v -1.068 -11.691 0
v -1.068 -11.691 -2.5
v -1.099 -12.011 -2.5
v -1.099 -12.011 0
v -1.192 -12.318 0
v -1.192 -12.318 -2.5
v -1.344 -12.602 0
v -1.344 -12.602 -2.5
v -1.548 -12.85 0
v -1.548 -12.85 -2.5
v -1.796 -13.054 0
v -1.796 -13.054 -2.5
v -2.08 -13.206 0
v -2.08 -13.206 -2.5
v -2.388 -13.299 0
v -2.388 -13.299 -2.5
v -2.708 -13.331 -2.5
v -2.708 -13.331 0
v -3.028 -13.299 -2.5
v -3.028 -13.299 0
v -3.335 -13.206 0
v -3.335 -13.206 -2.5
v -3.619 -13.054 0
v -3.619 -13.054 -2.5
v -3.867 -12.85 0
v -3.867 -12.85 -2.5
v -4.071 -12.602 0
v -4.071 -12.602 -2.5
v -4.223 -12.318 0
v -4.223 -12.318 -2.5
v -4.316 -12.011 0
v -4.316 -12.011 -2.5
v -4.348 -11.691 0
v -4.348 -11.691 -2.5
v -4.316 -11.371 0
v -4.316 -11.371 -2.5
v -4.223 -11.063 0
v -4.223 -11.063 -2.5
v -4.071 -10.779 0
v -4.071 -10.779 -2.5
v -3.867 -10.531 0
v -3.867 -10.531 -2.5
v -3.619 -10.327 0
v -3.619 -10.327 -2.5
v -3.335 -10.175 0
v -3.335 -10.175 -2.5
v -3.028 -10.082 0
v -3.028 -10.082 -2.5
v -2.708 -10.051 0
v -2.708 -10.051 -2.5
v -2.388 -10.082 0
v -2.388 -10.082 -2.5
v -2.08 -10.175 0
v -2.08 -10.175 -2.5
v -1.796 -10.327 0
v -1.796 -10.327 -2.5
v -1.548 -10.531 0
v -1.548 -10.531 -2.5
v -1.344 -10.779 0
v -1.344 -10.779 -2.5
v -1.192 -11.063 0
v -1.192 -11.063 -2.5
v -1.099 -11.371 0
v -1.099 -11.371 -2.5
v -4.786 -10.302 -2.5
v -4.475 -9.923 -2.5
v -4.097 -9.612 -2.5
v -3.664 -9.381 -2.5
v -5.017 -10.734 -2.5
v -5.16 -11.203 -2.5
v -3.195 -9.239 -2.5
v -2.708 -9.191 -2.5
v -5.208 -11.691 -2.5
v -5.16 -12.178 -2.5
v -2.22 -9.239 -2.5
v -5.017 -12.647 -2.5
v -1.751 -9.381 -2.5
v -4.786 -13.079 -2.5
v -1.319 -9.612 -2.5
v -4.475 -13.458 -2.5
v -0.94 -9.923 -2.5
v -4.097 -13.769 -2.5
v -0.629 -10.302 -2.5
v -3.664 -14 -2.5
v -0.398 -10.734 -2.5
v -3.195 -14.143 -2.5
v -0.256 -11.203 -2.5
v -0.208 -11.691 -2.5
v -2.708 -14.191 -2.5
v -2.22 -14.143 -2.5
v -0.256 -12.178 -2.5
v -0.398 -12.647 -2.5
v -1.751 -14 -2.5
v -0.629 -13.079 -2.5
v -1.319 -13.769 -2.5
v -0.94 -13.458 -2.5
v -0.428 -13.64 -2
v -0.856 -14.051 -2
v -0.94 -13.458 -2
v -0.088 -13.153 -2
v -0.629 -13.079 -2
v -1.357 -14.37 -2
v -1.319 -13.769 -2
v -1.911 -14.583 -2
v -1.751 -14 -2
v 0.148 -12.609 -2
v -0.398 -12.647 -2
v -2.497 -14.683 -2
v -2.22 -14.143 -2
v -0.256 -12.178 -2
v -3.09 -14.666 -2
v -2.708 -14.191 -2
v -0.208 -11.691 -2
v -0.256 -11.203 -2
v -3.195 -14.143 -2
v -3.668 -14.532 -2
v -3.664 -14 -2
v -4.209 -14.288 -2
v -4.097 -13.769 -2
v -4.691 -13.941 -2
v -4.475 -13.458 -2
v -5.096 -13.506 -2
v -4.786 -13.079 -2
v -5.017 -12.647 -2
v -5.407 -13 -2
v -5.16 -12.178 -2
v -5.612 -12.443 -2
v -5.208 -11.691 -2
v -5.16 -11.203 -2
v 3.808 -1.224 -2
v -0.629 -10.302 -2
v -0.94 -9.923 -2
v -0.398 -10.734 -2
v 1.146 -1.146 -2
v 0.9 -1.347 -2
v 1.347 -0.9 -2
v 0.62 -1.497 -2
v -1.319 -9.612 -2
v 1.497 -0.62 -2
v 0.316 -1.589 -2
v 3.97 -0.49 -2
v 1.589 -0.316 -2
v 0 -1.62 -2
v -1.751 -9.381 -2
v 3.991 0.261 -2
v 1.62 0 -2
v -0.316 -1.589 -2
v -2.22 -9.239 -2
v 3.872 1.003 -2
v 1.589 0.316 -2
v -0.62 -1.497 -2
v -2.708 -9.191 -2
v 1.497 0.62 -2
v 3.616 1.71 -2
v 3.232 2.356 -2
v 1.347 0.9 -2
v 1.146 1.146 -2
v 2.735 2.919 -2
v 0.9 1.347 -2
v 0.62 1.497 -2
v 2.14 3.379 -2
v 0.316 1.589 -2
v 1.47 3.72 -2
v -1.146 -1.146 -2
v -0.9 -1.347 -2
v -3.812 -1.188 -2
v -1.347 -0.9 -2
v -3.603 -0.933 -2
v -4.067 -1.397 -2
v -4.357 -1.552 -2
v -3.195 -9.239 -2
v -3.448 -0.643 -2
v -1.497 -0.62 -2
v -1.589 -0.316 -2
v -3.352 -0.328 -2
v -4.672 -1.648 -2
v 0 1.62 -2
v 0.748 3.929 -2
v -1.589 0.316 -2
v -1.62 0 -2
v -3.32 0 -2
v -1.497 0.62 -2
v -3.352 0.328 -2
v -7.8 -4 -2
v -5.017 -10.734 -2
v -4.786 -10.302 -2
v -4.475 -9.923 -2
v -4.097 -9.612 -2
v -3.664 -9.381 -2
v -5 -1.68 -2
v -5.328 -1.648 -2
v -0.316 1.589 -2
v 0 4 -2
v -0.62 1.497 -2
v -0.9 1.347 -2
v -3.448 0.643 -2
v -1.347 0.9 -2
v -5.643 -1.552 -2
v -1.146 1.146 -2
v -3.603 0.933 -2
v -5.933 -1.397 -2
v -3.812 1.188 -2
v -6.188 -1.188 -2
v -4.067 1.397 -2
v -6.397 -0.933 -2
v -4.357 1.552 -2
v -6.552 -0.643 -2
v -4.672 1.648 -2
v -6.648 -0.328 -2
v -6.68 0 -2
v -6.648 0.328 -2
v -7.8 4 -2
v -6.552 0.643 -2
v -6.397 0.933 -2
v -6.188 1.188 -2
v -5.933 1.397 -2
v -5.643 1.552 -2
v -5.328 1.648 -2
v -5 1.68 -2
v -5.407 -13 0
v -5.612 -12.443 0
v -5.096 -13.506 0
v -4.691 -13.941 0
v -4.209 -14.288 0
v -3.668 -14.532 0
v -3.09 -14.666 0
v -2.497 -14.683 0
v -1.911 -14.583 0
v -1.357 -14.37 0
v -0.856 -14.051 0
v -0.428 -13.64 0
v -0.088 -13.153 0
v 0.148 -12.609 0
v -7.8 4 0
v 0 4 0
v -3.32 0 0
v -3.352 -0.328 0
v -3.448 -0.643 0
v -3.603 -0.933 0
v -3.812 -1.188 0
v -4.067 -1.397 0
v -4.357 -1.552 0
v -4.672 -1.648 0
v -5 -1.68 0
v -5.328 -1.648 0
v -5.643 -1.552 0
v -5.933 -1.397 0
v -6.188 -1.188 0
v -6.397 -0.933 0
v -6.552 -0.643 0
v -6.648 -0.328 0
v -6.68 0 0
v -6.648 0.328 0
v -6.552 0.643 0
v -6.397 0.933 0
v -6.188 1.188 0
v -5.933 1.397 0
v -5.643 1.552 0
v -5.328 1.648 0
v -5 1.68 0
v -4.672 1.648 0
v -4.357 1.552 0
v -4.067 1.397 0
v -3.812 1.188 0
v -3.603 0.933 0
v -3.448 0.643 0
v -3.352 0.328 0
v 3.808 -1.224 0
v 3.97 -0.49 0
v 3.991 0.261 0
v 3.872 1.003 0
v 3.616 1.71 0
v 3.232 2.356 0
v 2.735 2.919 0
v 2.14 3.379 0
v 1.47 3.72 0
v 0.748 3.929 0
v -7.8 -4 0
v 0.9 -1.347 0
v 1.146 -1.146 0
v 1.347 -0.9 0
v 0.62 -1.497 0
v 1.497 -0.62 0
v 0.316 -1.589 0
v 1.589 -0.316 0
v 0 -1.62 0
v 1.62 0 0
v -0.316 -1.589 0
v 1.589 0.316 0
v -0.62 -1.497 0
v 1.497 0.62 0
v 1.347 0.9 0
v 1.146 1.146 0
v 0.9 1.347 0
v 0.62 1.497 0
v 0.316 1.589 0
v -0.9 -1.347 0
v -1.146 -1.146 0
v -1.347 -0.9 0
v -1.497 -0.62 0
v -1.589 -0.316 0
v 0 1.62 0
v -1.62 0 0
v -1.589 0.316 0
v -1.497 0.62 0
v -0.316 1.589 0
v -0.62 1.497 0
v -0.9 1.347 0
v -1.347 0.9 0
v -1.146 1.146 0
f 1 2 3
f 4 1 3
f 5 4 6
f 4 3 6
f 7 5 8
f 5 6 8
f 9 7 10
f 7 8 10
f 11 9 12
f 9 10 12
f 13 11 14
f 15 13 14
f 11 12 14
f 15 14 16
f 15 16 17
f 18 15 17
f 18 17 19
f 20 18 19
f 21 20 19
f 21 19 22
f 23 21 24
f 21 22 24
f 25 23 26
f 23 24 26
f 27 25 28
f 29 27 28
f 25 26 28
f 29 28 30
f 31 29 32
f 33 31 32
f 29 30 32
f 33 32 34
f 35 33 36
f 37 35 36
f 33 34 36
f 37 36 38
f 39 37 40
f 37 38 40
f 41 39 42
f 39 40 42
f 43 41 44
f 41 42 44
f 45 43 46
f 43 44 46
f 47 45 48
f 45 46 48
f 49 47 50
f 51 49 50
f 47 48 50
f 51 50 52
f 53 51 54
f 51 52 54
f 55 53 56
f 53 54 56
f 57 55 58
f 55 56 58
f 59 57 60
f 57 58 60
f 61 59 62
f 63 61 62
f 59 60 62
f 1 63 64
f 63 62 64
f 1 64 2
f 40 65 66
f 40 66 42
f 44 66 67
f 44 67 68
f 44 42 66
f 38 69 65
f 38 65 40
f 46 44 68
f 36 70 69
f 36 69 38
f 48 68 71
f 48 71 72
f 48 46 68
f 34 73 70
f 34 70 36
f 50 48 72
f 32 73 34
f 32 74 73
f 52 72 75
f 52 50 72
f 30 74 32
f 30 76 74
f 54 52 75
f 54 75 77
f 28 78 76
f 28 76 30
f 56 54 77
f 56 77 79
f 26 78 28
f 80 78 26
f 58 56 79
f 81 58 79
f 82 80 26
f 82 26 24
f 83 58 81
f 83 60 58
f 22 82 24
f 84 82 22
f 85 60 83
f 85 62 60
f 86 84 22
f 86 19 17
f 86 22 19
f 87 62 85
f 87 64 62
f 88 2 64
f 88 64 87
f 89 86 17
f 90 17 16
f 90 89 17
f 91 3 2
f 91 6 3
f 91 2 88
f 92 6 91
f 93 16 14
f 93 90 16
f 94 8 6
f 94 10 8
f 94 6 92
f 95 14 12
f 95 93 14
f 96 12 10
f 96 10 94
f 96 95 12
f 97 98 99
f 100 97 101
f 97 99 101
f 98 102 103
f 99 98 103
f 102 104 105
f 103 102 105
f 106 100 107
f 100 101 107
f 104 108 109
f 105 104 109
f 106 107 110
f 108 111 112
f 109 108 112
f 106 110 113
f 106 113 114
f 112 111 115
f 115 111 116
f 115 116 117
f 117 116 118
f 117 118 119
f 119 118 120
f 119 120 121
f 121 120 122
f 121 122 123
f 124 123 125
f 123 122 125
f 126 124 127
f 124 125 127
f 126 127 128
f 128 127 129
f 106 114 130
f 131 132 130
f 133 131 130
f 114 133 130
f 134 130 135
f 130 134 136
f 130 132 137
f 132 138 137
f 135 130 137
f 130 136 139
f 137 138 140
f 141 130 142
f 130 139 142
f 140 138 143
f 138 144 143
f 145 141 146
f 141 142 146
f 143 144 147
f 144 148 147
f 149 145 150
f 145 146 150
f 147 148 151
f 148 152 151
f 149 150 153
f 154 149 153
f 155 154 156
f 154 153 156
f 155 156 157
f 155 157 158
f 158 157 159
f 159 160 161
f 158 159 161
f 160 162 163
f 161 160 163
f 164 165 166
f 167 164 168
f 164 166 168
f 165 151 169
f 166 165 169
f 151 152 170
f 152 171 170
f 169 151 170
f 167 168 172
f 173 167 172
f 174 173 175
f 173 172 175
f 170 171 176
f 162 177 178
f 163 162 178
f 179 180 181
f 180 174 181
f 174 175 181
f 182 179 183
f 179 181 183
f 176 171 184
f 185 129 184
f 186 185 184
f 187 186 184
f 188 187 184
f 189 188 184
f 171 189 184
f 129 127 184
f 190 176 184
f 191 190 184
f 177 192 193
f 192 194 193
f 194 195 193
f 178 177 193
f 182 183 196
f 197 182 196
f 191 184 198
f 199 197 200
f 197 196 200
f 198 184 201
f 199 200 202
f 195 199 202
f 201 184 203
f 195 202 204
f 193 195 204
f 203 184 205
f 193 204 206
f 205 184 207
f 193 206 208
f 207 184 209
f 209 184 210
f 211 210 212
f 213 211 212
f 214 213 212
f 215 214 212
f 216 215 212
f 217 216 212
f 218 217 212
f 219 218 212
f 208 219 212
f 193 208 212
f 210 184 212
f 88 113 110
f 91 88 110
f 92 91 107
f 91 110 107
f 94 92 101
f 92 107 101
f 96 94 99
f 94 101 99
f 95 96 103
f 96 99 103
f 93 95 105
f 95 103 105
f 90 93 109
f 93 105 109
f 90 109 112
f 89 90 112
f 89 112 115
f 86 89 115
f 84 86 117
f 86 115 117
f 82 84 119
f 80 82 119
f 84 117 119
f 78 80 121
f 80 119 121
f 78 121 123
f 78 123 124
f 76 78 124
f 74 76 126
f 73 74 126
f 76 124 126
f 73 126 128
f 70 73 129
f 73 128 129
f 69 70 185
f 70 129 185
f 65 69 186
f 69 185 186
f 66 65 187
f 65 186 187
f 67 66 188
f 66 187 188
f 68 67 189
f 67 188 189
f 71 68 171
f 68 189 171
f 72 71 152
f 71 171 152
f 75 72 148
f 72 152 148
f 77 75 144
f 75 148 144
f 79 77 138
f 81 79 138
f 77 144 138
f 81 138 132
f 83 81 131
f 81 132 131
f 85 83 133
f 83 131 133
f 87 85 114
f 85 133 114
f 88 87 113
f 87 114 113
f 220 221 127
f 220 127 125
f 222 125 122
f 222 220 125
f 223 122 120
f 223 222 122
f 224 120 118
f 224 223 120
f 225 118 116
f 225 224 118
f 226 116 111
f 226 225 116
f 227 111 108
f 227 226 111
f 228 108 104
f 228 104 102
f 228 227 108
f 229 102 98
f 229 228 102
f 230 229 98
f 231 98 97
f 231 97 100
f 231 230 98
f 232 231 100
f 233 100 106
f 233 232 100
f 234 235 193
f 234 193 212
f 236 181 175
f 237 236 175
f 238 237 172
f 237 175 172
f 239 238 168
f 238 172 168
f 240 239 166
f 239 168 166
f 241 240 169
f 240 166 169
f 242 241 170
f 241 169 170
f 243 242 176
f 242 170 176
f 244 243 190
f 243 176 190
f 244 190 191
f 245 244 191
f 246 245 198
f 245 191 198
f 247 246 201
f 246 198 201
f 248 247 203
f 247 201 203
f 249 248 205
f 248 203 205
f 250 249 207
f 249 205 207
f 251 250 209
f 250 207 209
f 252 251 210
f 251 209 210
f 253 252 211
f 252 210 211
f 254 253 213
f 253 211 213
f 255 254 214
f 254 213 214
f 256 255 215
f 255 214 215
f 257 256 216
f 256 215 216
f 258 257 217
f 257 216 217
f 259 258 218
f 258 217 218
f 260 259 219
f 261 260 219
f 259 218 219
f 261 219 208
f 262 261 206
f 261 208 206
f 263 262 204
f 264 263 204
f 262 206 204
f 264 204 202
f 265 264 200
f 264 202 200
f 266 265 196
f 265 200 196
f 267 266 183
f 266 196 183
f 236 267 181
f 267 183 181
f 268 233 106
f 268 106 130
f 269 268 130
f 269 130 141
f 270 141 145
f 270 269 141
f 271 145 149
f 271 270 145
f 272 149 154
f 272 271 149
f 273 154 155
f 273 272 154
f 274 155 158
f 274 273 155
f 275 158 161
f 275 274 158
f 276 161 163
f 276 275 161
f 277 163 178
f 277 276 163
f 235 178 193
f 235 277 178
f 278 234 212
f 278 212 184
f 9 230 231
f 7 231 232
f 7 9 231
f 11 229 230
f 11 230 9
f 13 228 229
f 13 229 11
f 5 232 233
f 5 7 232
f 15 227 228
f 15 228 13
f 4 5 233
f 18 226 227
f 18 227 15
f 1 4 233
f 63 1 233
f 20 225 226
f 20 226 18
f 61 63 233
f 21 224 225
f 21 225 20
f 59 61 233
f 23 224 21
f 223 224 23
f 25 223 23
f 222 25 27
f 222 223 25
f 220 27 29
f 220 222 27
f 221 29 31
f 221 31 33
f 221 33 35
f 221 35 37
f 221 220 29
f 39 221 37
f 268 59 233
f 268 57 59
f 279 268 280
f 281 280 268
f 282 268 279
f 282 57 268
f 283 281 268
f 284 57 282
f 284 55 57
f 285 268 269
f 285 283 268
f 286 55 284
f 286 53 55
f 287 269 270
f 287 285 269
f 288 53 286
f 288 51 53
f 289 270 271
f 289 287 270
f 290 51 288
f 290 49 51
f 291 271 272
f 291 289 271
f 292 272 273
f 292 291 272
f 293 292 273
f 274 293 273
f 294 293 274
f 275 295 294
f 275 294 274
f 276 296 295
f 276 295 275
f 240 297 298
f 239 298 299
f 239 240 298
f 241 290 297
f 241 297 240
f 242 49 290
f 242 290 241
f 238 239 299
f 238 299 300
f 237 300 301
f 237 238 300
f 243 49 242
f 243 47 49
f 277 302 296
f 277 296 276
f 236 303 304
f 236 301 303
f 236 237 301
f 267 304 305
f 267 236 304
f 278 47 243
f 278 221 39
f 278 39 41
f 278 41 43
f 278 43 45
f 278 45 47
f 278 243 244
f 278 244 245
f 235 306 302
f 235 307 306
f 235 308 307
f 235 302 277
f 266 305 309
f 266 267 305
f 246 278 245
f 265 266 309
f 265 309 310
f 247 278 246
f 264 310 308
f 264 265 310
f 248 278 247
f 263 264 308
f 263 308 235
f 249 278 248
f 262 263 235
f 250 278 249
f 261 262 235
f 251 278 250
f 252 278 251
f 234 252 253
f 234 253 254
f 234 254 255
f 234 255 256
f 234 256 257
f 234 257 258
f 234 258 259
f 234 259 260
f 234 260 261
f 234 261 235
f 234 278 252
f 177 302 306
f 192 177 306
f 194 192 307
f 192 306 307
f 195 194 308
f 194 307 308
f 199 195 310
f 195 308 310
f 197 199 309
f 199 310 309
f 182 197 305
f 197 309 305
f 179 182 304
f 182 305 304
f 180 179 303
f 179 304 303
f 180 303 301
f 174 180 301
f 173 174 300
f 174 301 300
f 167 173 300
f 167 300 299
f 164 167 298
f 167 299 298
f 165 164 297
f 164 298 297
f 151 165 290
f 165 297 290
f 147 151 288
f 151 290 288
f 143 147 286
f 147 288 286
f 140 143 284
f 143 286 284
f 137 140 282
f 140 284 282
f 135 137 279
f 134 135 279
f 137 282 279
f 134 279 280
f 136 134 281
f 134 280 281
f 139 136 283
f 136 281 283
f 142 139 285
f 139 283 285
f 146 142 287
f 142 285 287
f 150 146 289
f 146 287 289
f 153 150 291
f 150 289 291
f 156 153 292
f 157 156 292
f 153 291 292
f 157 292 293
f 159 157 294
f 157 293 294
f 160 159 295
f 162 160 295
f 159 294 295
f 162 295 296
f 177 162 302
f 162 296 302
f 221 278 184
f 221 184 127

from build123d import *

# Parameters (mm, degrees)
BINDER_R        = 1.62
PAD_DEPTH       = 2
SKETCH_R        = 1.68
POCKET_DEPTH    = 2
SKETCH001_R     = 2.5
PAD001_DEPTH    = 0.5
SKETCH002_R     = 1.64
POCKET001_DEPTH = 2.5


with BuildPart() as part:
    # Binder → Pad (new body)
    with BuildSketch(Plane(origin=(-2.505049, -4.237344, 0), x_dir=(0, 1, 0), z_dir=(0, 0, 1))):
        with BuildLine():
            ThreePointArc((-8.205901, 3.106567), (-10.451974, 0.288635), (-8.371302, -2.653539))
            Line((-8.371302, -2.653539), (3.01322, -6.313136))
            ThreePointArc((3.01322, -6.313136), (6.59356, -5.737424), (8.237344, -2.505049))
            Line((8.237344, -2.505049), (8.237344, 5.294951))
            Line((8.237344, 5.294951), (0.237344, 5.294951))
            Line((0.237344, 5.294951), (-8.205901, 3.106567))
        make_face()
        with Locations((4.237344, -2.505049)):
            Circle(BINDER_R, mode=Mode.SUBTRACT)
    extrude(amount=-PAD_DEPTH)

    # Sketch (on Face9 of Pad) → Pocket (cut)
    with BuildSketch(Plane(origin=(0, 0, -2), x_dir=(1, 0, 0), z_dir=(0, 0, -1))):
        with Locations((-5, 0)):
            Circle(SKETCH_R)
    extrude(amount=-POCKET_DEPTH, mode=Mode.SUBTRACT)

    # Sketch001 (on Face5 of Pocket) → Pad001 (join)
    with BuildSketch(Plane(origin=(0, 0, -2), x_dir=(1, 0, 0), z_dir=(0, 0, -1))):
        with Locations((-2.707575, 11.690553)):
            Circle(SKETCH001_R)
    extrude(amount=PAD001_DEPTH)

    # Sketch002 (on Face12 of Pad001) → Pocket001 (cut)
    with BuildSketch(Plane(origin=(0, 0, -2.5), x_dir=(1, 0, 0), z_dir=(0, 0, -1))):
        with Locations((-2.707575, 11.690553)):
            Circle(SKETCH002_R)
    extrude(amount=-POCKET001_DEPTH, mode=Mode.SUBTRACT)


solid = part.part
